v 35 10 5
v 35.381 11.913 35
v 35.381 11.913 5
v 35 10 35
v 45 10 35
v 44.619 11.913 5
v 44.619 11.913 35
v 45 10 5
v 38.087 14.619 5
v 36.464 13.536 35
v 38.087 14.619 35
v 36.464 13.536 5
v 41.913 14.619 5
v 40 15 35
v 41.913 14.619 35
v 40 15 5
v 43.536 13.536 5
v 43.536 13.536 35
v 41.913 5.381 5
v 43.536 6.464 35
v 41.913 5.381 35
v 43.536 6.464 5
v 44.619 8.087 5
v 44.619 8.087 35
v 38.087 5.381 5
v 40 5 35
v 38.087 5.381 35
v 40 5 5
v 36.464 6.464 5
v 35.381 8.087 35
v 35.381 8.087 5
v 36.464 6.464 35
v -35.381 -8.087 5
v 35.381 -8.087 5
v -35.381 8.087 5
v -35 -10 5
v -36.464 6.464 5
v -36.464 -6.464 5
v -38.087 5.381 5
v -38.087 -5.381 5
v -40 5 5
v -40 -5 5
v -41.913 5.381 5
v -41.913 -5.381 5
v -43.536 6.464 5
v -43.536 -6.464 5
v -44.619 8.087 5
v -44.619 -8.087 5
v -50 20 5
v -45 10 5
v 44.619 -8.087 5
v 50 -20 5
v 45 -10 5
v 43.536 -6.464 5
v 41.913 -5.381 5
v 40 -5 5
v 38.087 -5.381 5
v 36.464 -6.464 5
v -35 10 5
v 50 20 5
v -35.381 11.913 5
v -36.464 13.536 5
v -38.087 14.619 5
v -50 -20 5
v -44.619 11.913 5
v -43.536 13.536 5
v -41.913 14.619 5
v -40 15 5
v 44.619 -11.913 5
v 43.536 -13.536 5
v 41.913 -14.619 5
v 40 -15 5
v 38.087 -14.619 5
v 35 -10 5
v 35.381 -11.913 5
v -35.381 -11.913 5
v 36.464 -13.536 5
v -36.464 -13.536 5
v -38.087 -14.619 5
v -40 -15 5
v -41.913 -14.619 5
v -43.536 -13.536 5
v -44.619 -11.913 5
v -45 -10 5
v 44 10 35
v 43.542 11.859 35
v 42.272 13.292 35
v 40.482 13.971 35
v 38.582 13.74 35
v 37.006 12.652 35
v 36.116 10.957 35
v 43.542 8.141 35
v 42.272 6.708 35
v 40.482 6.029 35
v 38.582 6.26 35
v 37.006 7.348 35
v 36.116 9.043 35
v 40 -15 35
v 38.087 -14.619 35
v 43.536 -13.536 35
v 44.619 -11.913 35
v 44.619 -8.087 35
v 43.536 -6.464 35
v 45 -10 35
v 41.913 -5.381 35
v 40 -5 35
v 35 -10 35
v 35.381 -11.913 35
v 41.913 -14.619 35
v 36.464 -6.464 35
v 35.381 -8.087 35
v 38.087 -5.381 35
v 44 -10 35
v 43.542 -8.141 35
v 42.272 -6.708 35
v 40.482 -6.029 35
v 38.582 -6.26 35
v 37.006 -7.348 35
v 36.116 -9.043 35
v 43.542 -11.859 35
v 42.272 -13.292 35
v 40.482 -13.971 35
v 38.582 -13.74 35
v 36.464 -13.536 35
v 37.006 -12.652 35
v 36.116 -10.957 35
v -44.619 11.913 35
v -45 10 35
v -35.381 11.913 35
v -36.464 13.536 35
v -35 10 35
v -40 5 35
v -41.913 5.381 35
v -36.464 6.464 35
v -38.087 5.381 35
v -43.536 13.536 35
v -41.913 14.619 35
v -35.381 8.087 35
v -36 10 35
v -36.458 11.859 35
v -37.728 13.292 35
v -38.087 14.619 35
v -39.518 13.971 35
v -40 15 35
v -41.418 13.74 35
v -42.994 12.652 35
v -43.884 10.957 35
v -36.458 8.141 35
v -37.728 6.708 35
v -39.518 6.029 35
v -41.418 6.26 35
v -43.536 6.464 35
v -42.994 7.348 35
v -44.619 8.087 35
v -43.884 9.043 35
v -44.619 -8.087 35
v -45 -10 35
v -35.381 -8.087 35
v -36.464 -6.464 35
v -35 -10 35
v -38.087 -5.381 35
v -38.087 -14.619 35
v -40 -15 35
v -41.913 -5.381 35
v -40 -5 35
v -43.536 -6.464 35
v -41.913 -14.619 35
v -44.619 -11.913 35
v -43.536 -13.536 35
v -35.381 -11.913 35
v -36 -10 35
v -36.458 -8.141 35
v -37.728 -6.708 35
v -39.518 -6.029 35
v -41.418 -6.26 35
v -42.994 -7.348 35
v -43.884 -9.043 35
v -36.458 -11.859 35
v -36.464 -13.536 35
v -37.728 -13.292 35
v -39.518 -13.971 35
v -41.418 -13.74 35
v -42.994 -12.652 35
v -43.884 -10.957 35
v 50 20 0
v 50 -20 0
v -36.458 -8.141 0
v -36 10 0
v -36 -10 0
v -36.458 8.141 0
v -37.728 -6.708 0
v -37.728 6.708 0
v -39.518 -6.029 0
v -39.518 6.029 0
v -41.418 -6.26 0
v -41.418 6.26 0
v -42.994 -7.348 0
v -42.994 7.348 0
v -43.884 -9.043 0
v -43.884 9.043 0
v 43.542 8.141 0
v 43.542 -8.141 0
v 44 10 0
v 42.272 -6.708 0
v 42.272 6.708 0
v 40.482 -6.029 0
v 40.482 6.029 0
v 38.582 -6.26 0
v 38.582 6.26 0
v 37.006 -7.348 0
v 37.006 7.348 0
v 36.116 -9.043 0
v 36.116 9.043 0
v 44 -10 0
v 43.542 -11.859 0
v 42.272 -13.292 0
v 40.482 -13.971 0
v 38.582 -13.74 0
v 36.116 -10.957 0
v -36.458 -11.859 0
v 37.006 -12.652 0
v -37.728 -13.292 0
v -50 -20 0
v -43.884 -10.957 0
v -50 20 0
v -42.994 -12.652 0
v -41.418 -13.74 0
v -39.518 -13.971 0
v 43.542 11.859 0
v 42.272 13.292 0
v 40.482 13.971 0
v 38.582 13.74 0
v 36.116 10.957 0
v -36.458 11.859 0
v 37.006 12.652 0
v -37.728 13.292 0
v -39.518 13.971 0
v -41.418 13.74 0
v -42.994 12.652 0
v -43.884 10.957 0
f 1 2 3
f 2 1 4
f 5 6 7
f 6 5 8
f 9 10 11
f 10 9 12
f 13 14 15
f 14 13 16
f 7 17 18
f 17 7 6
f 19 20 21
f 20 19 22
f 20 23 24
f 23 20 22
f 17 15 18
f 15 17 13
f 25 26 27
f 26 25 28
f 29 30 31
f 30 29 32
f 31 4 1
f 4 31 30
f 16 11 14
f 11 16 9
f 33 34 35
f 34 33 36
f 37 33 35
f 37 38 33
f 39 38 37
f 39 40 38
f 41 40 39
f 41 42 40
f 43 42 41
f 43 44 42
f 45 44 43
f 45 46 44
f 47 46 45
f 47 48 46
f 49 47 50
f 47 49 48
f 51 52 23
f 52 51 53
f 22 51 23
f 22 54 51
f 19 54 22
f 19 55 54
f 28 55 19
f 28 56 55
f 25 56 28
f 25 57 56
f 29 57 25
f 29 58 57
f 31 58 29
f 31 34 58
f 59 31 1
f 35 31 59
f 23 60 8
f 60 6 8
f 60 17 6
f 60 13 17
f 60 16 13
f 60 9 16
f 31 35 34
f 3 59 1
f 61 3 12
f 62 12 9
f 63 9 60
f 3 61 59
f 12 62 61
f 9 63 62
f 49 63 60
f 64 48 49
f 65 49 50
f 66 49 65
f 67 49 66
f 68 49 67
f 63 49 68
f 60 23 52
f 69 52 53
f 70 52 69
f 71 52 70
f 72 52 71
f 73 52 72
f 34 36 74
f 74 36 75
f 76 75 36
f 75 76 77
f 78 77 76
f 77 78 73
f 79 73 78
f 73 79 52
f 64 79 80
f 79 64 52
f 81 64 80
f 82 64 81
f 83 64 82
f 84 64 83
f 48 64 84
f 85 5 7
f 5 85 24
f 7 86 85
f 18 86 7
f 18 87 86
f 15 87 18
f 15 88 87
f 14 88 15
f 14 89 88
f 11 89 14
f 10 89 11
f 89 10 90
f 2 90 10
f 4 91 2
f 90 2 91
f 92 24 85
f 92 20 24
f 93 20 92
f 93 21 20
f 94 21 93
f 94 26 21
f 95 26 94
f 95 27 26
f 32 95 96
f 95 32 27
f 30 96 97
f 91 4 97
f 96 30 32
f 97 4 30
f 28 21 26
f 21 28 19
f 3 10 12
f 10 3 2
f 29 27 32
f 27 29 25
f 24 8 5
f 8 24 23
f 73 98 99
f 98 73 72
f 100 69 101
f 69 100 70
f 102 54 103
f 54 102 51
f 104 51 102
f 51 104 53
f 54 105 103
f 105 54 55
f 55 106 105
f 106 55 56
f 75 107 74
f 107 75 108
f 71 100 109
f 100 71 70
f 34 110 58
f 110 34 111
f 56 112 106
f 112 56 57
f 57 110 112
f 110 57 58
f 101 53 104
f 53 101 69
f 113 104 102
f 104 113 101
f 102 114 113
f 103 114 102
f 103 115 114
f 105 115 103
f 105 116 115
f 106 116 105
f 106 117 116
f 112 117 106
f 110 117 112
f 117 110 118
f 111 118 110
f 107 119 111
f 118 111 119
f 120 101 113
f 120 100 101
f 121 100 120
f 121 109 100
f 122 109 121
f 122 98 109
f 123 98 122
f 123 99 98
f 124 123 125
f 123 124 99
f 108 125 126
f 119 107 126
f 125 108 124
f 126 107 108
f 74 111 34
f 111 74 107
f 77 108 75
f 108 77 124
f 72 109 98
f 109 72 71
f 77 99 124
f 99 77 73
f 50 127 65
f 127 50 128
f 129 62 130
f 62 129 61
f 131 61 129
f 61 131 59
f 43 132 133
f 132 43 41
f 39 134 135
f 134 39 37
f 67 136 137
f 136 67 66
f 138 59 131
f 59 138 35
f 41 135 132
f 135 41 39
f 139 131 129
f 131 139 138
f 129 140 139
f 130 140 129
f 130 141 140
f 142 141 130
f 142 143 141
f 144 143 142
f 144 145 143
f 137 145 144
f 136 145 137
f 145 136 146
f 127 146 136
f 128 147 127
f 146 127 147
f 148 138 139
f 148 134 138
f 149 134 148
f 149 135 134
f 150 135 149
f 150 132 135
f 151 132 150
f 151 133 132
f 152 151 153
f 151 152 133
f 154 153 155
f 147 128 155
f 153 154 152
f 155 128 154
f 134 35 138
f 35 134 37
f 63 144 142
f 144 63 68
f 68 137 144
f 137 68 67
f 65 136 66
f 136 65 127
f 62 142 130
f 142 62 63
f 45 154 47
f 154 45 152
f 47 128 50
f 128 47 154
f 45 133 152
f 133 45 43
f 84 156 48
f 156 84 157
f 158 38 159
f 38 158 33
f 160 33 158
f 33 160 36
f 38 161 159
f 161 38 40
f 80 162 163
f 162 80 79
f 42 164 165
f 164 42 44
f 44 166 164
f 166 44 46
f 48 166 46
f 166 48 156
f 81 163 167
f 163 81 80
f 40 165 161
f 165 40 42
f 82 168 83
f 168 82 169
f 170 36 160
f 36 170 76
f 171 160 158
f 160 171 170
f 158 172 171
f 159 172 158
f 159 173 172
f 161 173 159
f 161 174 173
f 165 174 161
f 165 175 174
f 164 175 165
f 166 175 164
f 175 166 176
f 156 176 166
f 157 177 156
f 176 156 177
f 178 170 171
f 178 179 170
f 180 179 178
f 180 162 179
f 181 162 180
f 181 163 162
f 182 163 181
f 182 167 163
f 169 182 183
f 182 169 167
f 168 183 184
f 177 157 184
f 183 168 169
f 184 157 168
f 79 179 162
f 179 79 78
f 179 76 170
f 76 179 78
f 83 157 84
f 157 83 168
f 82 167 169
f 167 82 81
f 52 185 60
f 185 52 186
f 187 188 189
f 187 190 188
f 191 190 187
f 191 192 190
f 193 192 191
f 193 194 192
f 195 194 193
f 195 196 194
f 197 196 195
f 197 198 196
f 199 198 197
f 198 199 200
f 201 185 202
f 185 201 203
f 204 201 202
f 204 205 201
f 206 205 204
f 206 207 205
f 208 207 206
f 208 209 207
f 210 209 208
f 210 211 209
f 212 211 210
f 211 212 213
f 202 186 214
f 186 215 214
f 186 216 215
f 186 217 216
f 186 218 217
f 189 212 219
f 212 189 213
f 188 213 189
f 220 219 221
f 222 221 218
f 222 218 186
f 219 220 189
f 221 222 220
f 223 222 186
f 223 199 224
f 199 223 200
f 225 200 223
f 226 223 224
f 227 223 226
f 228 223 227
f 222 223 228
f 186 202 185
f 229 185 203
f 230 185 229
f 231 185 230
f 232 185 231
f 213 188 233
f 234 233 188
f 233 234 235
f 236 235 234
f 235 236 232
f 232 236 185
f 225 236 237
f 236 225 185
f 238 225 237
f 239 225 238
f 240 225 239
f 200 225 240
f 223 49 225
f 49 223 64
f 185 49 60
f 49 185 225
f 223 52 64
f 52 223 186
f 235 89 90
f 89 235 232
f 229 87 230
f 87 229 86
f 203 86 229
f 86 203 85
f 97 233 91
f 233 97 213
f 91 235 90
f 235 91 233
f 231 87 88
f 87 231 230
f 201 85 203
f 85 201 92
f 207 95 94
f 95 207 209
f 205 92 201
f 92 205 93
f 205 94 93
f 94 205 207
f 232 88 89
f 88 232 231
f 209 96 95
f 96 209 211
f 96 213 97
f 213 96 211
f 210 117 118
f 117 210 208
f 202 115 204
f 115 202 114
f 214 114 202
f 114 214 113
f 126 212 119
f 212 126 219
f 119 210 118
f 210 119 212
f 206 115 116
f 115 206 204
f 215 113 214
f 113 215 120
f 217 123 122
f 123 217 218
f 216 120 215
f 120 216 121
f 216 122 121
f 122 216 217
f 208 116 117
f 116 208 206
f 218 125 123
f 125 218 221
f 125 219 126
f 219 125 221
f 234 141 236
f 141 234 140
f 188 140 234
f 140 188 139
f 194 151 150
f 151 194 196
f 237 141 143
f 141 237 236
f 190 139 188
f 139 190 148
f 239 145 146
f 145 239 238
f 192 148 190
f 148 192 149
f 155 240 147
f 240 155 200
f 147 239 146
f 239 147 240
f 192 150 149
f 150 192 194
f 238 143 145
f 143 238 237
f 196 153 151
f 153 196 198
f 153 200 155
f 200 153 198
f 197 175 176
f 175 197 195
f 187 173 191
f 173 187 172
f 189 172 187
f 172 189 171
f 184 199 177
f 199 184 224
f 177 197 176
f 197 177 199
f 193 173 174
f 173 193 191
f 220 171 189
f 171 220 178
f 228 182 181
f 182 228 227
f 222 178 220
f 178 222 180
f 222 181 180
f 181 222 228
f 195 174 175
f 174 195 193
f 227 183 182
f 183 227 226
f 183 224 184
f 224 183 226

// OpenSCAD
/**
 * Plate
 * Obdélníková podložka pod elektroniku na 4 rohové šroubky
 * @param x Šířka podložky
 * @param y Délka podložky
 * @param z Výška/tloušťka posložky
 * @param c Vzdálenost osy šroubu od rohu (všude stejná)
 * @param r Poloměr díry na šroub
 * @param b Poloměr sloupku na šroub
 * @param h Výška sloupku na šroub
 * @author Miro Hrončok, Jakub Průša
 */
 
  
//#import("stls/plate.stl");

module plate(
    x=70,
    y=90,
    z=2,
    c=5,
    r=1.5,
    b=2.5,
    h=3
) {

    difference() {        

        union() {
            translate([ -x/2, -y/2, 0 ])
                cube([ x, y, z ]);

            for ( i=[1,-1], j=[1,-1] ) {
                translate([i*(x/2-c),j*(y/2-c),z])
                    cylinder( r=b, h=h );    
            }
        }
    
    for ( i=[1,-1], j=[1,-1] ) {
            translate([i*(x/2-c),j*(y/2-c),-z])
                #cylinder( r=r, h=2*h+2*z );
    }
}

}


//plate();

plate(
    x=100,
    y=40,
    z=5,
    c=10,
    r=4,
    b=5,
    h=30
);
